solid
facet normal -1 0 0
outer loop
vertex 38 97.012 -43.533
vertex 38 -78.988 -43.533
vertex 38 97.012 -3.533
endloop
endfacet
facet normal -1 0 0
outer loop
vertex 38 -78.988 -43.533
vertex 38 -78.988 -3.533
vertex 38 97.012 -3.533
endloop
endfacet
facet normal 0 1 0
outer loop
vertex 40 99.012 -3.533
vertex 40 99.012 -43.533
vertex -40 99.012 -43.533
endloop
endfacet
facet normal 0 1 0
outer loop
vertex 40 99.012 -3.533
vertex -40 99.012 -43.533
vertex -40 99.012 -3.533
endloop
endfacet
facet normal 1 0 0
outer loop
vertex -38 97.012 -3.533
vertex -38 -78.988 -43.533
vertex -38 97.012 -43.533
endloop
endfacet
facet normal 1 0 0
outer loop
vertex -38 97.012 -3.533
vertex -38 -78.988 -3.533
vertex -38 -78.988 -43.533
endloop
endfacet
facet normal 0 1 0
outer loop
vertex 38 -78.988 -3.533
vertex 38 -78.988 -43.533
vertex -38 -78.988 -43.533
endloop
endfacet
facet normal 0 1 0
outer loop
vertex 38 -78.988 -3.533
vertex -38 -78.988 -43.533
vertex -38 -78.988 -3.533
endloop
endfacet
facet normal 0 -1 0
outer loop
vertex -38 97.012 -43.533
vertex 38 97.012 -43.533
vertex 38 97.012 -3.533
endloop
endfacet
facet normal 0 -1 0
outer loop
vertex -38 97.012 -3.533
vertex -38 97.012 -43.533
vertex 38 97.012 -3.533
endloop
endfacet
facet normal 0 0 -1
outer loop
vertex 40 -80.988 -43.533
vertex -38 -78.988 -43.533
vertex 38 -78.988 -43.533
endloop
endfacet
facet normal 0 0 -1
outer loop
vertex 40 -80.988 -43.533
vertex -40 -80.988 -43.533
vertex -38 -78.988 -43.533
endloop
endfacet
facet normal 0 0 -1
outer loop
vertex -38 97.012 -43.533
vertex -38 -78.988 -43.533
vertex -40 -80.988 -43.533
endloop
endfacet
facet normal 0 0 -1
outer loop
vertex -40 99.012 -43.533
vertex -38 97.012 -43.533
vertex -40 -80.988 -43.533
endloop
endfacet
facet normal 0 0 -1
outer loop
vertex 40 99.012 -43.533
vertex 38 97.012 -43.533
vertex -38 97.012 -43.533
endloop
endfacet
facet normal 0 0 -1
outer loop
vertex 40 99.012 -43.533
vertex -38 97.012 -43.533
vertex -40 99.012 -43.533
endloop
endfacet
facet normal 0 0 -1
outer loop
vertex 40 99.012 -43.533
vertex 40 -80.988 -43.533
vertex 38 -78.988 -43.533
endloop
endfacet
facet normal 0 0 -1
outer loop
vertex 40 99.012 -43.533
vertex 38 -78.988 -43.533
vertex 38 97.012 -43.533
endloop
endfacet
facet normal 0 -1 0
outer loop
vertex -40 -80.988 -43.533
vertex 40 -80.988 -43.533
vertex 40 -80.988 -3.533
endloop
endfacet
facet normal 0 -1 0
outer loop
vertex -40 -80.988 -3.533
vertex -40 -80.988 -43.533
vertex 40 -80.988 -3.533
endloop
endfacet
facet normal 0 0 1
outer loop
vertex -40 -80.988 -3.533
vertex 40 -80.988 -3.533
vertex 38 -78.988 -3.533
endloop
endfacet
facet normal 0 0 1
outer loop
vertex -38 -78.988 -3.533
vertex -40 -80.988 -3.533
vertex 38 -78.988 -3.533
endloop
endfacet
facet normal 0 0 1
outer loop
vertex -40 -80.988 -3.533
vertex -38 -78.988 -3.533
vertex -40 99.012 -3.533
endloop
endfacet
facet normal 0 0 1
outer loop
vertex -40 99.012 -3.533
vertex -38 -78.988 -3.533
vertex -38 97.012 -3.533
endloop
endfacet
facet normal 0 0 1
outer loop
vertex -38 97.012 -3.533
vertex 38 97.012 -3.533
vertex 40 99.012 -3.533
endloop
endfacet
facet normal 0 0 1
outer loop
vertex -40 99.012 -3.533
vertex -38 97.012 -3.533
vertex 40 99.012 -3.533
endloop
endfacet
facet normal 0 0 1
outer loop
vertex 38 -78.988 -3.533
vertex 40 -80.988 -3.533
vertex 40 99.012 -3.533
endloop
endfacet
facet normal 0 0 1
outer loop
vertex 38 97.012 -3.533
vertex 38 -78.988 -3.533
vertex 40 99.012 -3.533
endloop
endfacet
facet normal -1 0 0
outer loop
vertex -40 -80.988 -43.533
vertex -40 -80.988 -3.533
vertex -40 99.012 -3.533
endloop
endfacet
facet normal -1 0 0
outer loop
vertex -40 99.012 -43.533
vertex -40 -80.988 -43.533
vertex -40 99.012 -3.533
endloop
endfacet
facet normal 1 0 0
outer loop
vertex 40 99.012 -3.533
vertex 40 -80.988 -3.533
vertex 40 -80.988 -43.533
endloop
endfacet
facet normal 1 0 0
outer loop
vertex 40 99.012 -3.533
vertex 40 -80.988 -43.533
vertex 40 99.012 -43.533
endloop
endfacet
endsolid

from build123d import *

# Parameters (mm, degrees)
F0_W     = 180
F0_H     = 40
F1_DEPTH = 40
F2_T     = -2


with BuildPart() as f1:
    # F0 (on Right) → F1 (new body, symmetric)
    with BuildSketch(Plane.YZ):
        with Locations((9.012016, -23.53282)):
            Rectangle(F0_W, F0_H)
    extrude(amount=F1_DEPTH, both=True)

    # F2
    f2_openings = [f1.faces().sort_by_distance(p)[0] for p in [
        (0, 9.012016, -3.53282),
        (0, 9.012016, -43.53282),
    ]]
    offset(amount=F2_T, openings=f2_openings)


solid = f1.part
